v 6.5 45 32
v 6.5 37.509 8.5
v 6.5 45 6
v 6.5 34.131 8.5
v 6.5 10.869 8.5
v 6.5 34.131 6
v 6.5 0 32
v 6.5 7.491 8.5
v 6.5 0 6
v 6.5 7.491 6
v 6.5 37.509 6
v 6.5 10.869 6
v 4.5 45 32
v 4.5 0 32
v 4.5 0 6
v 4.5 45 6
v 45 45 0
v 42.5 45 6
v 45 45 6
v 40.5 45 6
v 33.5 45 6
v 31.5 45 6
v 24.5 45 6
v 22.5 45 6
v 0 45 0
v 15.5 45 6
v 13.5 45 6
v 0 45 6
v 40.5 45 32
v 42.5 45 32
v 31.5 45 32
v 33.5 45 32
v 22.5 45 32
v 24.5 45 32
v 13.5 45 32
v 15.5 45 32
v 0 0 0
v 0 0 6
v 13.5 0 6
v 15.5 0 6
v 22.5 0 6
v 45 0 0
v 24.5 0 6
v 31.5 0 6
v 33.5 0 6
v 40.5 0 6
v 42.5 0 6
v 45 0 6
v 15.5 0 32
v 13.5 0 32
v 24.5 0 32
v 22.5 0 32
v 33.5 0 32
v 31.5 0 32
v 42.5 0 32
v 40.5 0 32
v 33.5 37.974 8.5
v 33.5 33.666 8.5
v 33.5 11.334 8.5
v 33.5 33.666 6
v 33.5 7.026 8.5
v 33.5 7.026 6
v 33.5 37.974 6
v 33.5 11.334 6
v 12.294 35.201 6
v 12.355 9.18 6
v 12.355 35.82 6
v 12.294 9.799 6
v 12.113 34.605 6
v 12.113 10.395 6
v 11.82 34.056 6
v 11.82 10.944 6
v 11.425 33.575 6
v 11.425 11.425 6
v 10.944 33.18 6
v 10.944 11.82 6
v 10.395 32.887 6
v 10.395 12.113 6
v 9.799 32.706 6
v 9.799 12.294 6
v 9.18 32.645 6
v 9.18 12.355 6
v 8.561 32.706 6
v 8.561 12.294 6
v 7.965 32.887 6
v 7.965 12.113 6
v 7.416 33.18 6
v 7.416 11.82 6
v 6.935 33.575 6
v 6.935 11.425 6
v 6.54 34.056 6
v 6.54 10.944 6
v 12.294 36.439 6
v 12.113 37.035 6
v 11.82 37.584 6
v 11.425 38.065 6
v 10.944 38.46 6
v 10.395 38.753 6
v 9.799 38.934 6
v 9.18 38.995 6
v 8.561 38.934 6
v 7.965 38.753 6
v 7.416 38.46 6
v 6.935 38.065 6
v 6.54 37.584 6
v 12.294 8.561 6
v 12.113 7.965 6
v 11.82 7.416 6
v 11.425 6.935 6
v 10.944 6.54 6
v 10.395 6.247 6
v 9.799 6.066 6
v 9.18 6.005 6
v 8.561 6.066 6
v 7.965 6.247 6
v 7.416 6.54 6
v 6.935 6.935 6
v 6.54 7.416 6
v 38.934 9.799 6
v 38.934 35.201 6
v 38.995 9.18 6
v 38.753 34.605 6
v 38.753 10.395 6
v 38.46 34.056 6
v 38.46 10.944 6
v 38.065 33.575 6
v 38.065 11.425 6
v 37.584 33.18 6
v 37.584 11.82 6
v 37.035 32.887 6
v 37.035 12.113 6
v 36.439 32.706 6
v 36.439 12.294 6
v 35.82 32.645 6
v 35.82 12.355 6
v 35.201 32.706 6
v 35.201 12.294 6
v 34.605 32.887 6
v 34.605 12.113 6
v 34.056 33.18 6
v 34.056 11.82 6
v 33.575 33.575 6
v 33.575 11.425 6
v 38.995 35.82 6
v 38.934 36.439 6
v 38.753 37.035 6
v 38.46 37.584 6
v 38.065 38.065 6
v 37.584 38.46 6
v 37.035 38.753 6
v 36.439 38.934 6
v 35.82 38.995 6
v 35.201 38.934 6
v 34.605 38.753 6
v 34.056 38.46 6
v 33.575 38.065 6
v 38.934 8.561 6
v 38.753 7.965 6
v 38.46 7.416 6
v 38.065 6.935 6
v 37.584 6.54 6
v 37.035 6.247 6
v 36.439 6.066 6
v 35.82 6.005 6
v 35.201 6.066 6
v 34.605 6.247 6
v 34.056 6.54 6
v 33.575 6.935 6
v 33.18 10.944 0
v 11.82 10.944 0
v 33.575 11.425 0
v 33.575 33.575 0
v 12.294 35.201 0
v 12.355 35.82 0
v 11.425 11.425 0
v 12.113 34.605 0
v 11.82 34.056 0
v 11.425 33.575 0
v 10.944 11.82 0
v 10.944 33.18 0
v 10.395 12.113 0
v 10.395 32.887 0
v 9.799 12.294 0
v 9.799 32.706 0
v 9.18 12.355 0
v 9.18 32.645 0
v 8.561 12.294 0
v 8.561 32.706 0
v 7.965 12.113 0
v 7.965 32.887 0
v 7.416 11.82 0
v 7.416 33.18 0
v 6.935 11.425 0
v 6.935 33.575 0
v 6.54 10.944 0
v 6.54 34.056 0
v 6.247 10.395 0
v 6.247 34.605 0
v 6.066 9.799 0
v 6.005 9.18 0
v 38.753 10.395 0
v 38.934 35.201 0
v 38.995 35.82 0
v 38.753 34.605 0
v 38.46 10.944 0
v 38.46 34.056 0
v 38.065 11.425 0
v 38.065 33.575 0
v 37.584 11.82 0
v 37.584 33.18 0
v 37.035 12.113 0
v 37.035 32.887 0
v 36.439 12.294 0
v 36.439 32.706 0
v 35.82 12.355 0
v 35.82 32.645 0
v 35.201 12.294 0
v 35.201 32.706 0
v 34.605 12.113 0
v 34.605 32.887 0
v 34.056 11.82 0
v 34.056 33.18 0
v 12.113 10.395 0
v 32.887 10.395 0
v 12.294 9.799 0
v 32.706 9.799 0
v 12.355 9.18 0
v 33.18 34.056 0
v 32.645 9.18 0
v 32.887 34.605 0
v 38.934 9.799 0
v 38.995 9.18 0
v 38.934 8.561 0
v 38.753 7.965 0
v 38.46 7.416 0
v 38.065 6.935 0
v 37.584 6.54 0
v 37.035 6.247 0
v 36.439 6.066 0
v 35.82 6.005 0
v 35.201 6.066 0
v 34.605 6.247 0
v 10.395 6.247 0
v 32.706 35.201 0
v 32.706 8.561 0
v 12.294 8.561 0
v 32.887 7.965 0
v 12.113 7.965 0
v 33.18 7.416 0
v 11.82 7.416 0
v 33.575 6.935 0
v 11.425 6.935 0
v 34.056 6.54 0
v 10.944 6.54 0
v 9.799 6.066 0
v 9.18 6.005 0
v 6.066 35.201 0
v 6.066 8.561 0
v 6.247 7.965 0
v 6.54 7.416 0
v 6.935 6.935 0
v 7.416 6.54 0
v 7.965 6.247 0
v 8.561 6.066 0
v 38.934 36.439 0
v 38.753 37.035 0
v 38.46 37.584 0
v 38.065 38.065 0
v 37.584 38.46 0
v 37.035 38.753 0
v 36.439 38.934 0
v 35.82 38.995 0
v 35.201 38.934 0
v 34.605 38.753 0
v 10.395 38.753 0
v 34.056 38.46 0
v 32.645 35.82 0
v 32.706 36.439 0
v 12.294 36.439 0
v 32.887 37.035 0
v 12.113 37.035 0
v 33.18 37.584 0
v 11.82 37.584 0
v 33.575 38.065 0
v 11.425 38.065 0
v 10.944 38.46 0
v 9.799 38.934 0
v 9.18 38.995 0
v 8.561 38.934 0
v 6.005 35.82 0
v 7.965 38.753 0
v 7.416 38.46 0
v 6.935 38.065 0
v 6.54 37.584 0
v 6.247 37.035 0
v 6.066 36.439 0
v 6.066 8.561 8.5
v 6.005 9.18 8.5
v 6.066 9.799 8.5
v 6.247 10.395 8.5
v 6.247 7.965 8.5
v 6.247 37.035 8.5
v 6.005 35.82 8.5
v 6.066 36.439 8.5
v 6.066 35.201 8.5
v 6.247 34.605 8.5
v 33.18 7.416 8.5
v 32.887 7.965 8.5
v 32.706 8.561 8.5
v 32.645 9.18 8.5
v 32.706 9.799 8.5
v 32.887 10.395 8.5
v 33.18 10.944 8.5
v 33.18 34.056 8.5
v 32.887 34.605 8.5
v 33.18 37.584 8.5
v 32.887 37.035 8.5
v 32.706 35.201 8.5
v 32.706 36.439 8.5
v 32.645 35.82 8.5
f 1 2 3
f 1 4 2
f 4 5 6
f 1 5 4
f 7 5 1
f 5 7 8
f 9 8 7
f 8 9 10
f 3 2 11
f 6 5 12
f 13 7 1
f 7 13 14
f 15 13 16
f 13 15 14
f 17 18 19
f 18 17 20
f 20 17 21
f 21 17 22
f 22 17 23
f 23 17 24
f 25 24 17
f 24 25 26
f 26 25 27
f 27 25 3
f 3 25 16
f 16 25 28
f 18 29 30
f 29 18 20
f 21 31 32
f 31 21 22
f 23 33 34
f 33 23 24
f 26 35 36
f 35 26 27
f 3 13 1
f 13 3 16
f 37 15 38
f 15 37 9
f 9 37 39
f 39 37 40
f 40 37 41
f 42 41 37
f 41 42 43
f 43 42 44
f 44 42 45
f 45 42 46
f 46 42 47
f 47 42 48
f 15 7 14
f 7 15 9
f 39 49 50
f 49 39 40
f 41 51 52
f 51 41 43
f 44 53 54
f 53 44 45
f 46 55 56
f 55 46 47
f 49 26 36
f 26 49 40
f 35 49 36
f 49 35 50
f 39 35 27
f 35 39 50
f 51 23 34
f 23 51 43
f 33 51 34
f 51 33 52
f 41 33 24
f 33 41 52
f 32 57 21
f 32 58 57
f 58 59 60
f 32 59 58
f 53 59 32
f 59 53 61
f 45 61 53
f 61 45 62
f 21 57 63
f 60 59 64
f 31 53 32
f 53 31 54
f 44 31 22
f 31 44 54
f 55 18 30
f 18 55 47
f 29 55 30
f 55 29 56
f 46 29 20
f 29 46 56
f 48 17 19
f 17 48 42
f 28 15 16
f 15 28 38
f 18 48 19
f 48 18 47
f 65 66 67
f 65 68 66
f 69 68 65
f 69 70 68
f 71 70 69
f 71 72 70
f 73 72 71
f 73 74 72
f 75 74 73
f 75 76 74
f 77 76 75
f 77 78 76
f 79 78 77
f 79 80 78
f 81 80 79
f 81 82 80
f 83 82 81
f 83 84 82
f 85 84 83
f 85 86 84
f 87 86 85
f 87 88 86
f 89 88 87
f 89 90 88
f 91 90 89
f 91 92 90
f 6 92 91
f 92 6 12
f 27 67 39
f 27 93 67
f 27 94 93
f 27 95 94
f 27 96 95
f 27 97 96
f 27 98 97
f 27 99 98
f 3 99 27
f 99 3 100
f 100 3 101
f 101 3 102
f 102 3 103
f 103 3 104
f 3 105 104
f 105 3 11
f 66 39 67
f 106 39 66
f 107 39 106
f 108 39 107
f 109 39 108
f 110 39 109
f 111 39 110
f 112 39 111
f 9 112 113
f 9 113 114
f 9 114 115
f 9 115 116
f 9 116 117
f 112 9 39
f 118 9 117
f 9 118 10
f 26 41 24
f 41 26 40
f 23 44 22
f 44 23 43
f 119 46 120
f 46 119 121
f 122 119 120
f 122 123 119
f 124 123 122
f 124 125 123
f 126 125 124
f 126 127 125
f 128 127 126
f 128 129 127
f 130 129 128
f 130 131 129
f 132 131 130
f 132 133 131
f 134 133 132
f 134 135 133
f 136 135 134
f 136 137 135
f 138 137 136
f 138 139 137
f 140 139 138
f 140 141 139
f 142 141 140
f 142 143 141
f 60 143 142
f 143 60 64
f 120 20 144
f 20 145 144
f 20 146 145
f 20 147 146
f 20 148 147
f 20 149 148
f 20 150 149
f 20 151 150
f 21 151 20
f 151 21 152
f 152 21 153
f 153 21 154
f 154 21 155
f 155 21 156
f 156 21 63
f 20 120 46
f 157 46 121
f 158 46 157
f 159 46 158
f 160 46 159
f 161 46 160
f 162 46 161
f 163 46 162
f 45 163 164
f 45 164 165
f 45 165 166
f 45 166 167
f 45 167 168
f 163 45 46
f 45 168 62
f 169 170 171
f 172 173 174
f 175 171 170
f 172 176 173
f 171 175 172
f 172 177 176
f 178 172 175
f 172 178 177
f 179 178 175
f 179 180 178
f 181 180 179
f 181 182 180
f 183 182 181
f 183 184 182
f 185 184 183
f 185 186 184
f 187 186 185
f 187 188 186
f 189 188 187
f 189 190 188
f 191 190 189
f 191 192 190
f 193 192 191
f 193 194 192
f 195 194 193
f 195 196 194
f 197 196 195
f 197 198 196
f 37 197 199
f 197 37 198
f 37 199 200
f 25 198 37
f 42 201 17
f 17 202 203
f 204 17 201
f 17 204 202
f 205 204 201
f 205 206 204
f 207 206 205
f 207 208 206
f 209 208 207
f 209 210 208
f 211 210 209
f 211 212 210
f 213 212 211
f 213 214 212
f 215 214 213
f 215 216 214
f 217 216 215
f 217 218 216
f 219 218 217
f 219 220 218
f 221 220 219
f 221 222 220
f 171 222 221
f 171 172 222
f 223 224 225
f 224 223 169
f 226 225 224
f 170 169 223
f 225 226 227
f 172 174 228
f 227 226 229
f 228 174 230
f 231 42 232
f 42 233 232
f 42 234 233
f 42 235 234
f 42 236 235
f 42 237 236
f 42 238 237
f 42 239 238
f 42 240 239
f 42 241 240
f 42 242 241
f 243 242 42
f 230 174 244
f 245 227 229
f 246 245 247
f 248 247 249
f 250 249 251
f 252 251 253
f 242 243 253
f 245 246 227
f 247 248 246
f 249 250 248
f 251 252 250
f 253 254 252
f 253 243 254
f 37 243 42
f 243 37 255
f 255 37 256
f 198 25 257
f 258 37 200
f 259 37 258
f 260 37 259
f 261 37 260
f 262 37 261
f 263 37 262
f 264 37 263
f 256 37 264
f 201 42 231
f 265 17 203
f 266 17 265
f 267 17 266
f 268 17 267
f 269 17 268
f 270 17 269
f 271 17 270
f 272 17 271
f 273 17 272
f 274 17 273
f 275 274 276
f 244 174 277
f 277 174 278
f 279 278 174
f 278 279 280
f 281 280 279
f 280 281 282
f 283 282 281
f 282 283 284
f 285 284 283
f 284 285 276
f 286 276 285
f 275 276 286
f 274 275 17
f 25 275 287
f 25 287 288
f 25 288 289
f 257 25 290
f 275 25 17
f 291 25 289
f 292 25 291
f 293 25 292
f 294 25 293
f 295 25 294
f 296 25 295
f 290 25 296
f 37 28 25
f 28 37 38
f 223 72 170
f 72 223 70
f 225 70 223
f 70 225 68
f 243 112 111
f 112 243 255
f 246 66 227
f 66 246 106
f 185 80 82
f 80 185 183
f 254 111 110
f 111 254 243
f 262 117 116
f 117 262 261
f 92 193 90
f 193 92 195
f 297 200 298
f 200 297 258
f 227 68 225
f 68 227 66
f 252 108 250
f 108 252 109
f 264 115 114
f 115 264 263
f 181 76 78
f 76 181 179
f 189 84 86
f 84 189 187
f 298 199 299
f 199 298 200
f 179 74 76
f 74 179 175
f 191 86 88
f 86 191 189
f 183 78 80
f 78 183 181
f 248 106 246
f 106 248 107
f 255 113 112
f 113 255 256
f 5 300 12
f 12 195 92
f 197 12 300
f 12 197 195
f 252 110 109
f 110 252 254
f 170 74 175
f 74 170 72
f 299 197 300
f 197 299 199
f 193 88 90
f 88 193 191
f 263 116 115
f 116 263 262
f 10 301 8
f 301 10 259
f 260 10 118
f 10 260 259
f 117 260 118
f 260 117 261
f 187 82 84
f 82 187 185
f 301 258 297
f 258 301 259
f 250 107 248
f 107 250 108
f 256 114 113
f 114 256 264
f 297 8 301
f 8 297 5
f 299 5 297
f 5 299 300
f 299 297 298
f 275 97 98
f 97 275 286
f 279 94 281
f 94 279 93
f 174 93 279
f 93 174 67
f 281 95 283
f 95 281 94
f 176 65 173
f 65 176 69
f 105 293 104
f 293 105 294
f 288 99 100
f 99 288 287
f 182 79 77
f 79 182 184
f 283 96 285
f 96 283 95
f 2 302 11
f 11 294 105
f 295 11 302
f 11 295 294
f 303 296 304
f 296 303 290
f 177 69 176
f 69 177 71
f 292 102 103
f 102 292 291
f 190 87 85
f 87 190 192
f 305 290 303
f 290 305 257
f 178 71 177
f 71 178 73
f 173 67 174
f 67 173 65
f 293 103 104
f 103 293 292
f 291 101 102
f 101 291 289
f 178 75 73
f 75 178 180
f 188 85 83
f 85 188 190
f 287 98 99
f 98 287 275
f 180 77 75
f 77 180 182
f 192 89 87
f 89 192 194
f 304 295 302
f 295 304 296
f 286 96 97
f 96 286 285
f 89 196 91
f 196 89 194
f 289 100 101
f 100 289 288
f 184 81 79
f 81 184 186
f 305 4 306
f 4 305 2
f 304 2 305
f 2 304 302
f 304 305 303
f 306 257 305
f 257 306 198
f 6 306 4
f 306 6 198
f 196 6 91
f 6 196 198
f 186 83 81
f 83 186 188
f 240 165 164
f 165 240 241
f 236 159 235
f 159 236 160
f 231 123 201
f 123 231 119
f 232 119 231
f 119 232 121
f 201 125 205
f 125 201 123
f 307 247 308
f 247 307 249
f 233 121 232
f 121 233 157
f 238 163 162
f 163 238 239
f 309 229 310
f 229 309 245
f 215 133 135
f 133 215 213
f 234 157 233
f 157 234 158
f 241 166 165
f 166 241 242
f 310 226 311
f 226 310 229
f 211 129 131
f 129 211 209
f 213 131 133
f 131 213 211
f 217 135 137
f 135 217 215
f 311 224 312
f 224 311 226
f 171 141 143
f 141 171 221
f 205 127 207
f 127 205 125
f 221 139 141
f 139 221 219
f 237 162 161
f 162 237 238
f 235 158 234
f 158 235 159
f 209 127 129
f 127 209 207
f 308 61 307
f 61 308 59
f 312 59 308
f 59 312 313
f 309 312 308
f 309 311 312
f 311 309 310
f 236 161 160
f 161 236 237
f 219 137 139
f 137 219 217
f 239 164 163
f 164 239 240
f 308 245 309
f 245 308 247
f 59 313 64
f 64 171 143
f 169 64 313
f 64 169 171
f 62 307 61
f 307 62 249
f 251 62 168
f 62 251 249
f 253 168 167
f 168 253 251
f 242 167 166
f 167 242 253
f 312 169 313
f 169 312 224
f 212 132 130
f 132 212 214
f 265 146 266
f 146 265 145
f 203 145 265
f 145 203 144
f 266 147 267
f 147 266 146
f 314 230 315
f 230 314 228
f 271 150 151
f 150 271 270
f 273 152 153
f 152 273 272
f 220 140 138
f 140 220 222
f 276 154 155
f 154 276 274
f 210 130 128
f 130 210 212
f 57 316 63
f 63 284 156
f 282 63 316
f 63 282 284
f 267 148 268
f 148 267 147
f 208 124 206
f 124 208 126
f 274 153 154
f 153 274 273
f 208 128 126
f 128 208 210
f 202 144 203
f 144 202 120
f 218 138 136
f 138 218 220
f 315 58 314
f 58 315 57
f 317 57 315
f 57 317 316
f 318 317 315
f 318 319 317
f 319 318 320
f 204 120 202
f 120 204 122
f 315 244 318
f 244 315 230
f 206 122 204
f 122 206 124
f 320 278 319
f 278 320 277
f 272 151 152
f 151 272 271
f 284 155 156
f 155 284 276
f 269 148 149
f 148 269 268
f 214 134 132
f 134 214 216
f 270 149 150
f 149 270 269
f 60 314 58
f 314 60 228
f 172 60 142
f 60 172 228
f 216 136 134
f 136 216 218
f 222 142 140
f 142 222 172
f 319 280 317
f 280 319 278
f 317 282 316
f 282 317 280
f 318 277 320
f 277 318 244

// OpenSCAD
$fn = 32;

// ----------------------------------------------------------------------
// Finned heat sink: 45 x 45 mm base, 26 mm fins
// ----------------------------------------------------------------------

// --- parameters (mm) ---
base_w = 45;              // base width
base_d = 45;              // base depth
base_t = 6;               // base thickness
fin_h = 26;               // fin height above the base
holes_d = 6.35;           // fixing holes
hole_x = 13.32;           // hole offset in x
hole_y = 13.32;           // hole offset in y
fin_t = 2;                // fin thickness
fin_pitch = 9;            // fin pitch
fin_count = 5;            // number of fins
fin_x0 = 4.5;             // first fin offset

difference() {
  union() {
    cube([base_w, base_d, base_t]);
    for (i = [0 : fin_count - 1]) {
      translate([fin_x0 + i * fin_pitch, 0, base_t - 0.5]) cube([fin_t, base_d, fin_h + 0.5]);
    }
  }
  /* fixing holes through the base, 2.5 mm clear on both sides */
  for (hx = [-13.32, 13.32]) {
    for (hy = [-13.32, 13.32]) {
      translate([base_w / 2 + hx, base_d / 2 + hy, -2.5]) cylinder(h = base_t + 5, d = holes_d);
    }
  }
}
